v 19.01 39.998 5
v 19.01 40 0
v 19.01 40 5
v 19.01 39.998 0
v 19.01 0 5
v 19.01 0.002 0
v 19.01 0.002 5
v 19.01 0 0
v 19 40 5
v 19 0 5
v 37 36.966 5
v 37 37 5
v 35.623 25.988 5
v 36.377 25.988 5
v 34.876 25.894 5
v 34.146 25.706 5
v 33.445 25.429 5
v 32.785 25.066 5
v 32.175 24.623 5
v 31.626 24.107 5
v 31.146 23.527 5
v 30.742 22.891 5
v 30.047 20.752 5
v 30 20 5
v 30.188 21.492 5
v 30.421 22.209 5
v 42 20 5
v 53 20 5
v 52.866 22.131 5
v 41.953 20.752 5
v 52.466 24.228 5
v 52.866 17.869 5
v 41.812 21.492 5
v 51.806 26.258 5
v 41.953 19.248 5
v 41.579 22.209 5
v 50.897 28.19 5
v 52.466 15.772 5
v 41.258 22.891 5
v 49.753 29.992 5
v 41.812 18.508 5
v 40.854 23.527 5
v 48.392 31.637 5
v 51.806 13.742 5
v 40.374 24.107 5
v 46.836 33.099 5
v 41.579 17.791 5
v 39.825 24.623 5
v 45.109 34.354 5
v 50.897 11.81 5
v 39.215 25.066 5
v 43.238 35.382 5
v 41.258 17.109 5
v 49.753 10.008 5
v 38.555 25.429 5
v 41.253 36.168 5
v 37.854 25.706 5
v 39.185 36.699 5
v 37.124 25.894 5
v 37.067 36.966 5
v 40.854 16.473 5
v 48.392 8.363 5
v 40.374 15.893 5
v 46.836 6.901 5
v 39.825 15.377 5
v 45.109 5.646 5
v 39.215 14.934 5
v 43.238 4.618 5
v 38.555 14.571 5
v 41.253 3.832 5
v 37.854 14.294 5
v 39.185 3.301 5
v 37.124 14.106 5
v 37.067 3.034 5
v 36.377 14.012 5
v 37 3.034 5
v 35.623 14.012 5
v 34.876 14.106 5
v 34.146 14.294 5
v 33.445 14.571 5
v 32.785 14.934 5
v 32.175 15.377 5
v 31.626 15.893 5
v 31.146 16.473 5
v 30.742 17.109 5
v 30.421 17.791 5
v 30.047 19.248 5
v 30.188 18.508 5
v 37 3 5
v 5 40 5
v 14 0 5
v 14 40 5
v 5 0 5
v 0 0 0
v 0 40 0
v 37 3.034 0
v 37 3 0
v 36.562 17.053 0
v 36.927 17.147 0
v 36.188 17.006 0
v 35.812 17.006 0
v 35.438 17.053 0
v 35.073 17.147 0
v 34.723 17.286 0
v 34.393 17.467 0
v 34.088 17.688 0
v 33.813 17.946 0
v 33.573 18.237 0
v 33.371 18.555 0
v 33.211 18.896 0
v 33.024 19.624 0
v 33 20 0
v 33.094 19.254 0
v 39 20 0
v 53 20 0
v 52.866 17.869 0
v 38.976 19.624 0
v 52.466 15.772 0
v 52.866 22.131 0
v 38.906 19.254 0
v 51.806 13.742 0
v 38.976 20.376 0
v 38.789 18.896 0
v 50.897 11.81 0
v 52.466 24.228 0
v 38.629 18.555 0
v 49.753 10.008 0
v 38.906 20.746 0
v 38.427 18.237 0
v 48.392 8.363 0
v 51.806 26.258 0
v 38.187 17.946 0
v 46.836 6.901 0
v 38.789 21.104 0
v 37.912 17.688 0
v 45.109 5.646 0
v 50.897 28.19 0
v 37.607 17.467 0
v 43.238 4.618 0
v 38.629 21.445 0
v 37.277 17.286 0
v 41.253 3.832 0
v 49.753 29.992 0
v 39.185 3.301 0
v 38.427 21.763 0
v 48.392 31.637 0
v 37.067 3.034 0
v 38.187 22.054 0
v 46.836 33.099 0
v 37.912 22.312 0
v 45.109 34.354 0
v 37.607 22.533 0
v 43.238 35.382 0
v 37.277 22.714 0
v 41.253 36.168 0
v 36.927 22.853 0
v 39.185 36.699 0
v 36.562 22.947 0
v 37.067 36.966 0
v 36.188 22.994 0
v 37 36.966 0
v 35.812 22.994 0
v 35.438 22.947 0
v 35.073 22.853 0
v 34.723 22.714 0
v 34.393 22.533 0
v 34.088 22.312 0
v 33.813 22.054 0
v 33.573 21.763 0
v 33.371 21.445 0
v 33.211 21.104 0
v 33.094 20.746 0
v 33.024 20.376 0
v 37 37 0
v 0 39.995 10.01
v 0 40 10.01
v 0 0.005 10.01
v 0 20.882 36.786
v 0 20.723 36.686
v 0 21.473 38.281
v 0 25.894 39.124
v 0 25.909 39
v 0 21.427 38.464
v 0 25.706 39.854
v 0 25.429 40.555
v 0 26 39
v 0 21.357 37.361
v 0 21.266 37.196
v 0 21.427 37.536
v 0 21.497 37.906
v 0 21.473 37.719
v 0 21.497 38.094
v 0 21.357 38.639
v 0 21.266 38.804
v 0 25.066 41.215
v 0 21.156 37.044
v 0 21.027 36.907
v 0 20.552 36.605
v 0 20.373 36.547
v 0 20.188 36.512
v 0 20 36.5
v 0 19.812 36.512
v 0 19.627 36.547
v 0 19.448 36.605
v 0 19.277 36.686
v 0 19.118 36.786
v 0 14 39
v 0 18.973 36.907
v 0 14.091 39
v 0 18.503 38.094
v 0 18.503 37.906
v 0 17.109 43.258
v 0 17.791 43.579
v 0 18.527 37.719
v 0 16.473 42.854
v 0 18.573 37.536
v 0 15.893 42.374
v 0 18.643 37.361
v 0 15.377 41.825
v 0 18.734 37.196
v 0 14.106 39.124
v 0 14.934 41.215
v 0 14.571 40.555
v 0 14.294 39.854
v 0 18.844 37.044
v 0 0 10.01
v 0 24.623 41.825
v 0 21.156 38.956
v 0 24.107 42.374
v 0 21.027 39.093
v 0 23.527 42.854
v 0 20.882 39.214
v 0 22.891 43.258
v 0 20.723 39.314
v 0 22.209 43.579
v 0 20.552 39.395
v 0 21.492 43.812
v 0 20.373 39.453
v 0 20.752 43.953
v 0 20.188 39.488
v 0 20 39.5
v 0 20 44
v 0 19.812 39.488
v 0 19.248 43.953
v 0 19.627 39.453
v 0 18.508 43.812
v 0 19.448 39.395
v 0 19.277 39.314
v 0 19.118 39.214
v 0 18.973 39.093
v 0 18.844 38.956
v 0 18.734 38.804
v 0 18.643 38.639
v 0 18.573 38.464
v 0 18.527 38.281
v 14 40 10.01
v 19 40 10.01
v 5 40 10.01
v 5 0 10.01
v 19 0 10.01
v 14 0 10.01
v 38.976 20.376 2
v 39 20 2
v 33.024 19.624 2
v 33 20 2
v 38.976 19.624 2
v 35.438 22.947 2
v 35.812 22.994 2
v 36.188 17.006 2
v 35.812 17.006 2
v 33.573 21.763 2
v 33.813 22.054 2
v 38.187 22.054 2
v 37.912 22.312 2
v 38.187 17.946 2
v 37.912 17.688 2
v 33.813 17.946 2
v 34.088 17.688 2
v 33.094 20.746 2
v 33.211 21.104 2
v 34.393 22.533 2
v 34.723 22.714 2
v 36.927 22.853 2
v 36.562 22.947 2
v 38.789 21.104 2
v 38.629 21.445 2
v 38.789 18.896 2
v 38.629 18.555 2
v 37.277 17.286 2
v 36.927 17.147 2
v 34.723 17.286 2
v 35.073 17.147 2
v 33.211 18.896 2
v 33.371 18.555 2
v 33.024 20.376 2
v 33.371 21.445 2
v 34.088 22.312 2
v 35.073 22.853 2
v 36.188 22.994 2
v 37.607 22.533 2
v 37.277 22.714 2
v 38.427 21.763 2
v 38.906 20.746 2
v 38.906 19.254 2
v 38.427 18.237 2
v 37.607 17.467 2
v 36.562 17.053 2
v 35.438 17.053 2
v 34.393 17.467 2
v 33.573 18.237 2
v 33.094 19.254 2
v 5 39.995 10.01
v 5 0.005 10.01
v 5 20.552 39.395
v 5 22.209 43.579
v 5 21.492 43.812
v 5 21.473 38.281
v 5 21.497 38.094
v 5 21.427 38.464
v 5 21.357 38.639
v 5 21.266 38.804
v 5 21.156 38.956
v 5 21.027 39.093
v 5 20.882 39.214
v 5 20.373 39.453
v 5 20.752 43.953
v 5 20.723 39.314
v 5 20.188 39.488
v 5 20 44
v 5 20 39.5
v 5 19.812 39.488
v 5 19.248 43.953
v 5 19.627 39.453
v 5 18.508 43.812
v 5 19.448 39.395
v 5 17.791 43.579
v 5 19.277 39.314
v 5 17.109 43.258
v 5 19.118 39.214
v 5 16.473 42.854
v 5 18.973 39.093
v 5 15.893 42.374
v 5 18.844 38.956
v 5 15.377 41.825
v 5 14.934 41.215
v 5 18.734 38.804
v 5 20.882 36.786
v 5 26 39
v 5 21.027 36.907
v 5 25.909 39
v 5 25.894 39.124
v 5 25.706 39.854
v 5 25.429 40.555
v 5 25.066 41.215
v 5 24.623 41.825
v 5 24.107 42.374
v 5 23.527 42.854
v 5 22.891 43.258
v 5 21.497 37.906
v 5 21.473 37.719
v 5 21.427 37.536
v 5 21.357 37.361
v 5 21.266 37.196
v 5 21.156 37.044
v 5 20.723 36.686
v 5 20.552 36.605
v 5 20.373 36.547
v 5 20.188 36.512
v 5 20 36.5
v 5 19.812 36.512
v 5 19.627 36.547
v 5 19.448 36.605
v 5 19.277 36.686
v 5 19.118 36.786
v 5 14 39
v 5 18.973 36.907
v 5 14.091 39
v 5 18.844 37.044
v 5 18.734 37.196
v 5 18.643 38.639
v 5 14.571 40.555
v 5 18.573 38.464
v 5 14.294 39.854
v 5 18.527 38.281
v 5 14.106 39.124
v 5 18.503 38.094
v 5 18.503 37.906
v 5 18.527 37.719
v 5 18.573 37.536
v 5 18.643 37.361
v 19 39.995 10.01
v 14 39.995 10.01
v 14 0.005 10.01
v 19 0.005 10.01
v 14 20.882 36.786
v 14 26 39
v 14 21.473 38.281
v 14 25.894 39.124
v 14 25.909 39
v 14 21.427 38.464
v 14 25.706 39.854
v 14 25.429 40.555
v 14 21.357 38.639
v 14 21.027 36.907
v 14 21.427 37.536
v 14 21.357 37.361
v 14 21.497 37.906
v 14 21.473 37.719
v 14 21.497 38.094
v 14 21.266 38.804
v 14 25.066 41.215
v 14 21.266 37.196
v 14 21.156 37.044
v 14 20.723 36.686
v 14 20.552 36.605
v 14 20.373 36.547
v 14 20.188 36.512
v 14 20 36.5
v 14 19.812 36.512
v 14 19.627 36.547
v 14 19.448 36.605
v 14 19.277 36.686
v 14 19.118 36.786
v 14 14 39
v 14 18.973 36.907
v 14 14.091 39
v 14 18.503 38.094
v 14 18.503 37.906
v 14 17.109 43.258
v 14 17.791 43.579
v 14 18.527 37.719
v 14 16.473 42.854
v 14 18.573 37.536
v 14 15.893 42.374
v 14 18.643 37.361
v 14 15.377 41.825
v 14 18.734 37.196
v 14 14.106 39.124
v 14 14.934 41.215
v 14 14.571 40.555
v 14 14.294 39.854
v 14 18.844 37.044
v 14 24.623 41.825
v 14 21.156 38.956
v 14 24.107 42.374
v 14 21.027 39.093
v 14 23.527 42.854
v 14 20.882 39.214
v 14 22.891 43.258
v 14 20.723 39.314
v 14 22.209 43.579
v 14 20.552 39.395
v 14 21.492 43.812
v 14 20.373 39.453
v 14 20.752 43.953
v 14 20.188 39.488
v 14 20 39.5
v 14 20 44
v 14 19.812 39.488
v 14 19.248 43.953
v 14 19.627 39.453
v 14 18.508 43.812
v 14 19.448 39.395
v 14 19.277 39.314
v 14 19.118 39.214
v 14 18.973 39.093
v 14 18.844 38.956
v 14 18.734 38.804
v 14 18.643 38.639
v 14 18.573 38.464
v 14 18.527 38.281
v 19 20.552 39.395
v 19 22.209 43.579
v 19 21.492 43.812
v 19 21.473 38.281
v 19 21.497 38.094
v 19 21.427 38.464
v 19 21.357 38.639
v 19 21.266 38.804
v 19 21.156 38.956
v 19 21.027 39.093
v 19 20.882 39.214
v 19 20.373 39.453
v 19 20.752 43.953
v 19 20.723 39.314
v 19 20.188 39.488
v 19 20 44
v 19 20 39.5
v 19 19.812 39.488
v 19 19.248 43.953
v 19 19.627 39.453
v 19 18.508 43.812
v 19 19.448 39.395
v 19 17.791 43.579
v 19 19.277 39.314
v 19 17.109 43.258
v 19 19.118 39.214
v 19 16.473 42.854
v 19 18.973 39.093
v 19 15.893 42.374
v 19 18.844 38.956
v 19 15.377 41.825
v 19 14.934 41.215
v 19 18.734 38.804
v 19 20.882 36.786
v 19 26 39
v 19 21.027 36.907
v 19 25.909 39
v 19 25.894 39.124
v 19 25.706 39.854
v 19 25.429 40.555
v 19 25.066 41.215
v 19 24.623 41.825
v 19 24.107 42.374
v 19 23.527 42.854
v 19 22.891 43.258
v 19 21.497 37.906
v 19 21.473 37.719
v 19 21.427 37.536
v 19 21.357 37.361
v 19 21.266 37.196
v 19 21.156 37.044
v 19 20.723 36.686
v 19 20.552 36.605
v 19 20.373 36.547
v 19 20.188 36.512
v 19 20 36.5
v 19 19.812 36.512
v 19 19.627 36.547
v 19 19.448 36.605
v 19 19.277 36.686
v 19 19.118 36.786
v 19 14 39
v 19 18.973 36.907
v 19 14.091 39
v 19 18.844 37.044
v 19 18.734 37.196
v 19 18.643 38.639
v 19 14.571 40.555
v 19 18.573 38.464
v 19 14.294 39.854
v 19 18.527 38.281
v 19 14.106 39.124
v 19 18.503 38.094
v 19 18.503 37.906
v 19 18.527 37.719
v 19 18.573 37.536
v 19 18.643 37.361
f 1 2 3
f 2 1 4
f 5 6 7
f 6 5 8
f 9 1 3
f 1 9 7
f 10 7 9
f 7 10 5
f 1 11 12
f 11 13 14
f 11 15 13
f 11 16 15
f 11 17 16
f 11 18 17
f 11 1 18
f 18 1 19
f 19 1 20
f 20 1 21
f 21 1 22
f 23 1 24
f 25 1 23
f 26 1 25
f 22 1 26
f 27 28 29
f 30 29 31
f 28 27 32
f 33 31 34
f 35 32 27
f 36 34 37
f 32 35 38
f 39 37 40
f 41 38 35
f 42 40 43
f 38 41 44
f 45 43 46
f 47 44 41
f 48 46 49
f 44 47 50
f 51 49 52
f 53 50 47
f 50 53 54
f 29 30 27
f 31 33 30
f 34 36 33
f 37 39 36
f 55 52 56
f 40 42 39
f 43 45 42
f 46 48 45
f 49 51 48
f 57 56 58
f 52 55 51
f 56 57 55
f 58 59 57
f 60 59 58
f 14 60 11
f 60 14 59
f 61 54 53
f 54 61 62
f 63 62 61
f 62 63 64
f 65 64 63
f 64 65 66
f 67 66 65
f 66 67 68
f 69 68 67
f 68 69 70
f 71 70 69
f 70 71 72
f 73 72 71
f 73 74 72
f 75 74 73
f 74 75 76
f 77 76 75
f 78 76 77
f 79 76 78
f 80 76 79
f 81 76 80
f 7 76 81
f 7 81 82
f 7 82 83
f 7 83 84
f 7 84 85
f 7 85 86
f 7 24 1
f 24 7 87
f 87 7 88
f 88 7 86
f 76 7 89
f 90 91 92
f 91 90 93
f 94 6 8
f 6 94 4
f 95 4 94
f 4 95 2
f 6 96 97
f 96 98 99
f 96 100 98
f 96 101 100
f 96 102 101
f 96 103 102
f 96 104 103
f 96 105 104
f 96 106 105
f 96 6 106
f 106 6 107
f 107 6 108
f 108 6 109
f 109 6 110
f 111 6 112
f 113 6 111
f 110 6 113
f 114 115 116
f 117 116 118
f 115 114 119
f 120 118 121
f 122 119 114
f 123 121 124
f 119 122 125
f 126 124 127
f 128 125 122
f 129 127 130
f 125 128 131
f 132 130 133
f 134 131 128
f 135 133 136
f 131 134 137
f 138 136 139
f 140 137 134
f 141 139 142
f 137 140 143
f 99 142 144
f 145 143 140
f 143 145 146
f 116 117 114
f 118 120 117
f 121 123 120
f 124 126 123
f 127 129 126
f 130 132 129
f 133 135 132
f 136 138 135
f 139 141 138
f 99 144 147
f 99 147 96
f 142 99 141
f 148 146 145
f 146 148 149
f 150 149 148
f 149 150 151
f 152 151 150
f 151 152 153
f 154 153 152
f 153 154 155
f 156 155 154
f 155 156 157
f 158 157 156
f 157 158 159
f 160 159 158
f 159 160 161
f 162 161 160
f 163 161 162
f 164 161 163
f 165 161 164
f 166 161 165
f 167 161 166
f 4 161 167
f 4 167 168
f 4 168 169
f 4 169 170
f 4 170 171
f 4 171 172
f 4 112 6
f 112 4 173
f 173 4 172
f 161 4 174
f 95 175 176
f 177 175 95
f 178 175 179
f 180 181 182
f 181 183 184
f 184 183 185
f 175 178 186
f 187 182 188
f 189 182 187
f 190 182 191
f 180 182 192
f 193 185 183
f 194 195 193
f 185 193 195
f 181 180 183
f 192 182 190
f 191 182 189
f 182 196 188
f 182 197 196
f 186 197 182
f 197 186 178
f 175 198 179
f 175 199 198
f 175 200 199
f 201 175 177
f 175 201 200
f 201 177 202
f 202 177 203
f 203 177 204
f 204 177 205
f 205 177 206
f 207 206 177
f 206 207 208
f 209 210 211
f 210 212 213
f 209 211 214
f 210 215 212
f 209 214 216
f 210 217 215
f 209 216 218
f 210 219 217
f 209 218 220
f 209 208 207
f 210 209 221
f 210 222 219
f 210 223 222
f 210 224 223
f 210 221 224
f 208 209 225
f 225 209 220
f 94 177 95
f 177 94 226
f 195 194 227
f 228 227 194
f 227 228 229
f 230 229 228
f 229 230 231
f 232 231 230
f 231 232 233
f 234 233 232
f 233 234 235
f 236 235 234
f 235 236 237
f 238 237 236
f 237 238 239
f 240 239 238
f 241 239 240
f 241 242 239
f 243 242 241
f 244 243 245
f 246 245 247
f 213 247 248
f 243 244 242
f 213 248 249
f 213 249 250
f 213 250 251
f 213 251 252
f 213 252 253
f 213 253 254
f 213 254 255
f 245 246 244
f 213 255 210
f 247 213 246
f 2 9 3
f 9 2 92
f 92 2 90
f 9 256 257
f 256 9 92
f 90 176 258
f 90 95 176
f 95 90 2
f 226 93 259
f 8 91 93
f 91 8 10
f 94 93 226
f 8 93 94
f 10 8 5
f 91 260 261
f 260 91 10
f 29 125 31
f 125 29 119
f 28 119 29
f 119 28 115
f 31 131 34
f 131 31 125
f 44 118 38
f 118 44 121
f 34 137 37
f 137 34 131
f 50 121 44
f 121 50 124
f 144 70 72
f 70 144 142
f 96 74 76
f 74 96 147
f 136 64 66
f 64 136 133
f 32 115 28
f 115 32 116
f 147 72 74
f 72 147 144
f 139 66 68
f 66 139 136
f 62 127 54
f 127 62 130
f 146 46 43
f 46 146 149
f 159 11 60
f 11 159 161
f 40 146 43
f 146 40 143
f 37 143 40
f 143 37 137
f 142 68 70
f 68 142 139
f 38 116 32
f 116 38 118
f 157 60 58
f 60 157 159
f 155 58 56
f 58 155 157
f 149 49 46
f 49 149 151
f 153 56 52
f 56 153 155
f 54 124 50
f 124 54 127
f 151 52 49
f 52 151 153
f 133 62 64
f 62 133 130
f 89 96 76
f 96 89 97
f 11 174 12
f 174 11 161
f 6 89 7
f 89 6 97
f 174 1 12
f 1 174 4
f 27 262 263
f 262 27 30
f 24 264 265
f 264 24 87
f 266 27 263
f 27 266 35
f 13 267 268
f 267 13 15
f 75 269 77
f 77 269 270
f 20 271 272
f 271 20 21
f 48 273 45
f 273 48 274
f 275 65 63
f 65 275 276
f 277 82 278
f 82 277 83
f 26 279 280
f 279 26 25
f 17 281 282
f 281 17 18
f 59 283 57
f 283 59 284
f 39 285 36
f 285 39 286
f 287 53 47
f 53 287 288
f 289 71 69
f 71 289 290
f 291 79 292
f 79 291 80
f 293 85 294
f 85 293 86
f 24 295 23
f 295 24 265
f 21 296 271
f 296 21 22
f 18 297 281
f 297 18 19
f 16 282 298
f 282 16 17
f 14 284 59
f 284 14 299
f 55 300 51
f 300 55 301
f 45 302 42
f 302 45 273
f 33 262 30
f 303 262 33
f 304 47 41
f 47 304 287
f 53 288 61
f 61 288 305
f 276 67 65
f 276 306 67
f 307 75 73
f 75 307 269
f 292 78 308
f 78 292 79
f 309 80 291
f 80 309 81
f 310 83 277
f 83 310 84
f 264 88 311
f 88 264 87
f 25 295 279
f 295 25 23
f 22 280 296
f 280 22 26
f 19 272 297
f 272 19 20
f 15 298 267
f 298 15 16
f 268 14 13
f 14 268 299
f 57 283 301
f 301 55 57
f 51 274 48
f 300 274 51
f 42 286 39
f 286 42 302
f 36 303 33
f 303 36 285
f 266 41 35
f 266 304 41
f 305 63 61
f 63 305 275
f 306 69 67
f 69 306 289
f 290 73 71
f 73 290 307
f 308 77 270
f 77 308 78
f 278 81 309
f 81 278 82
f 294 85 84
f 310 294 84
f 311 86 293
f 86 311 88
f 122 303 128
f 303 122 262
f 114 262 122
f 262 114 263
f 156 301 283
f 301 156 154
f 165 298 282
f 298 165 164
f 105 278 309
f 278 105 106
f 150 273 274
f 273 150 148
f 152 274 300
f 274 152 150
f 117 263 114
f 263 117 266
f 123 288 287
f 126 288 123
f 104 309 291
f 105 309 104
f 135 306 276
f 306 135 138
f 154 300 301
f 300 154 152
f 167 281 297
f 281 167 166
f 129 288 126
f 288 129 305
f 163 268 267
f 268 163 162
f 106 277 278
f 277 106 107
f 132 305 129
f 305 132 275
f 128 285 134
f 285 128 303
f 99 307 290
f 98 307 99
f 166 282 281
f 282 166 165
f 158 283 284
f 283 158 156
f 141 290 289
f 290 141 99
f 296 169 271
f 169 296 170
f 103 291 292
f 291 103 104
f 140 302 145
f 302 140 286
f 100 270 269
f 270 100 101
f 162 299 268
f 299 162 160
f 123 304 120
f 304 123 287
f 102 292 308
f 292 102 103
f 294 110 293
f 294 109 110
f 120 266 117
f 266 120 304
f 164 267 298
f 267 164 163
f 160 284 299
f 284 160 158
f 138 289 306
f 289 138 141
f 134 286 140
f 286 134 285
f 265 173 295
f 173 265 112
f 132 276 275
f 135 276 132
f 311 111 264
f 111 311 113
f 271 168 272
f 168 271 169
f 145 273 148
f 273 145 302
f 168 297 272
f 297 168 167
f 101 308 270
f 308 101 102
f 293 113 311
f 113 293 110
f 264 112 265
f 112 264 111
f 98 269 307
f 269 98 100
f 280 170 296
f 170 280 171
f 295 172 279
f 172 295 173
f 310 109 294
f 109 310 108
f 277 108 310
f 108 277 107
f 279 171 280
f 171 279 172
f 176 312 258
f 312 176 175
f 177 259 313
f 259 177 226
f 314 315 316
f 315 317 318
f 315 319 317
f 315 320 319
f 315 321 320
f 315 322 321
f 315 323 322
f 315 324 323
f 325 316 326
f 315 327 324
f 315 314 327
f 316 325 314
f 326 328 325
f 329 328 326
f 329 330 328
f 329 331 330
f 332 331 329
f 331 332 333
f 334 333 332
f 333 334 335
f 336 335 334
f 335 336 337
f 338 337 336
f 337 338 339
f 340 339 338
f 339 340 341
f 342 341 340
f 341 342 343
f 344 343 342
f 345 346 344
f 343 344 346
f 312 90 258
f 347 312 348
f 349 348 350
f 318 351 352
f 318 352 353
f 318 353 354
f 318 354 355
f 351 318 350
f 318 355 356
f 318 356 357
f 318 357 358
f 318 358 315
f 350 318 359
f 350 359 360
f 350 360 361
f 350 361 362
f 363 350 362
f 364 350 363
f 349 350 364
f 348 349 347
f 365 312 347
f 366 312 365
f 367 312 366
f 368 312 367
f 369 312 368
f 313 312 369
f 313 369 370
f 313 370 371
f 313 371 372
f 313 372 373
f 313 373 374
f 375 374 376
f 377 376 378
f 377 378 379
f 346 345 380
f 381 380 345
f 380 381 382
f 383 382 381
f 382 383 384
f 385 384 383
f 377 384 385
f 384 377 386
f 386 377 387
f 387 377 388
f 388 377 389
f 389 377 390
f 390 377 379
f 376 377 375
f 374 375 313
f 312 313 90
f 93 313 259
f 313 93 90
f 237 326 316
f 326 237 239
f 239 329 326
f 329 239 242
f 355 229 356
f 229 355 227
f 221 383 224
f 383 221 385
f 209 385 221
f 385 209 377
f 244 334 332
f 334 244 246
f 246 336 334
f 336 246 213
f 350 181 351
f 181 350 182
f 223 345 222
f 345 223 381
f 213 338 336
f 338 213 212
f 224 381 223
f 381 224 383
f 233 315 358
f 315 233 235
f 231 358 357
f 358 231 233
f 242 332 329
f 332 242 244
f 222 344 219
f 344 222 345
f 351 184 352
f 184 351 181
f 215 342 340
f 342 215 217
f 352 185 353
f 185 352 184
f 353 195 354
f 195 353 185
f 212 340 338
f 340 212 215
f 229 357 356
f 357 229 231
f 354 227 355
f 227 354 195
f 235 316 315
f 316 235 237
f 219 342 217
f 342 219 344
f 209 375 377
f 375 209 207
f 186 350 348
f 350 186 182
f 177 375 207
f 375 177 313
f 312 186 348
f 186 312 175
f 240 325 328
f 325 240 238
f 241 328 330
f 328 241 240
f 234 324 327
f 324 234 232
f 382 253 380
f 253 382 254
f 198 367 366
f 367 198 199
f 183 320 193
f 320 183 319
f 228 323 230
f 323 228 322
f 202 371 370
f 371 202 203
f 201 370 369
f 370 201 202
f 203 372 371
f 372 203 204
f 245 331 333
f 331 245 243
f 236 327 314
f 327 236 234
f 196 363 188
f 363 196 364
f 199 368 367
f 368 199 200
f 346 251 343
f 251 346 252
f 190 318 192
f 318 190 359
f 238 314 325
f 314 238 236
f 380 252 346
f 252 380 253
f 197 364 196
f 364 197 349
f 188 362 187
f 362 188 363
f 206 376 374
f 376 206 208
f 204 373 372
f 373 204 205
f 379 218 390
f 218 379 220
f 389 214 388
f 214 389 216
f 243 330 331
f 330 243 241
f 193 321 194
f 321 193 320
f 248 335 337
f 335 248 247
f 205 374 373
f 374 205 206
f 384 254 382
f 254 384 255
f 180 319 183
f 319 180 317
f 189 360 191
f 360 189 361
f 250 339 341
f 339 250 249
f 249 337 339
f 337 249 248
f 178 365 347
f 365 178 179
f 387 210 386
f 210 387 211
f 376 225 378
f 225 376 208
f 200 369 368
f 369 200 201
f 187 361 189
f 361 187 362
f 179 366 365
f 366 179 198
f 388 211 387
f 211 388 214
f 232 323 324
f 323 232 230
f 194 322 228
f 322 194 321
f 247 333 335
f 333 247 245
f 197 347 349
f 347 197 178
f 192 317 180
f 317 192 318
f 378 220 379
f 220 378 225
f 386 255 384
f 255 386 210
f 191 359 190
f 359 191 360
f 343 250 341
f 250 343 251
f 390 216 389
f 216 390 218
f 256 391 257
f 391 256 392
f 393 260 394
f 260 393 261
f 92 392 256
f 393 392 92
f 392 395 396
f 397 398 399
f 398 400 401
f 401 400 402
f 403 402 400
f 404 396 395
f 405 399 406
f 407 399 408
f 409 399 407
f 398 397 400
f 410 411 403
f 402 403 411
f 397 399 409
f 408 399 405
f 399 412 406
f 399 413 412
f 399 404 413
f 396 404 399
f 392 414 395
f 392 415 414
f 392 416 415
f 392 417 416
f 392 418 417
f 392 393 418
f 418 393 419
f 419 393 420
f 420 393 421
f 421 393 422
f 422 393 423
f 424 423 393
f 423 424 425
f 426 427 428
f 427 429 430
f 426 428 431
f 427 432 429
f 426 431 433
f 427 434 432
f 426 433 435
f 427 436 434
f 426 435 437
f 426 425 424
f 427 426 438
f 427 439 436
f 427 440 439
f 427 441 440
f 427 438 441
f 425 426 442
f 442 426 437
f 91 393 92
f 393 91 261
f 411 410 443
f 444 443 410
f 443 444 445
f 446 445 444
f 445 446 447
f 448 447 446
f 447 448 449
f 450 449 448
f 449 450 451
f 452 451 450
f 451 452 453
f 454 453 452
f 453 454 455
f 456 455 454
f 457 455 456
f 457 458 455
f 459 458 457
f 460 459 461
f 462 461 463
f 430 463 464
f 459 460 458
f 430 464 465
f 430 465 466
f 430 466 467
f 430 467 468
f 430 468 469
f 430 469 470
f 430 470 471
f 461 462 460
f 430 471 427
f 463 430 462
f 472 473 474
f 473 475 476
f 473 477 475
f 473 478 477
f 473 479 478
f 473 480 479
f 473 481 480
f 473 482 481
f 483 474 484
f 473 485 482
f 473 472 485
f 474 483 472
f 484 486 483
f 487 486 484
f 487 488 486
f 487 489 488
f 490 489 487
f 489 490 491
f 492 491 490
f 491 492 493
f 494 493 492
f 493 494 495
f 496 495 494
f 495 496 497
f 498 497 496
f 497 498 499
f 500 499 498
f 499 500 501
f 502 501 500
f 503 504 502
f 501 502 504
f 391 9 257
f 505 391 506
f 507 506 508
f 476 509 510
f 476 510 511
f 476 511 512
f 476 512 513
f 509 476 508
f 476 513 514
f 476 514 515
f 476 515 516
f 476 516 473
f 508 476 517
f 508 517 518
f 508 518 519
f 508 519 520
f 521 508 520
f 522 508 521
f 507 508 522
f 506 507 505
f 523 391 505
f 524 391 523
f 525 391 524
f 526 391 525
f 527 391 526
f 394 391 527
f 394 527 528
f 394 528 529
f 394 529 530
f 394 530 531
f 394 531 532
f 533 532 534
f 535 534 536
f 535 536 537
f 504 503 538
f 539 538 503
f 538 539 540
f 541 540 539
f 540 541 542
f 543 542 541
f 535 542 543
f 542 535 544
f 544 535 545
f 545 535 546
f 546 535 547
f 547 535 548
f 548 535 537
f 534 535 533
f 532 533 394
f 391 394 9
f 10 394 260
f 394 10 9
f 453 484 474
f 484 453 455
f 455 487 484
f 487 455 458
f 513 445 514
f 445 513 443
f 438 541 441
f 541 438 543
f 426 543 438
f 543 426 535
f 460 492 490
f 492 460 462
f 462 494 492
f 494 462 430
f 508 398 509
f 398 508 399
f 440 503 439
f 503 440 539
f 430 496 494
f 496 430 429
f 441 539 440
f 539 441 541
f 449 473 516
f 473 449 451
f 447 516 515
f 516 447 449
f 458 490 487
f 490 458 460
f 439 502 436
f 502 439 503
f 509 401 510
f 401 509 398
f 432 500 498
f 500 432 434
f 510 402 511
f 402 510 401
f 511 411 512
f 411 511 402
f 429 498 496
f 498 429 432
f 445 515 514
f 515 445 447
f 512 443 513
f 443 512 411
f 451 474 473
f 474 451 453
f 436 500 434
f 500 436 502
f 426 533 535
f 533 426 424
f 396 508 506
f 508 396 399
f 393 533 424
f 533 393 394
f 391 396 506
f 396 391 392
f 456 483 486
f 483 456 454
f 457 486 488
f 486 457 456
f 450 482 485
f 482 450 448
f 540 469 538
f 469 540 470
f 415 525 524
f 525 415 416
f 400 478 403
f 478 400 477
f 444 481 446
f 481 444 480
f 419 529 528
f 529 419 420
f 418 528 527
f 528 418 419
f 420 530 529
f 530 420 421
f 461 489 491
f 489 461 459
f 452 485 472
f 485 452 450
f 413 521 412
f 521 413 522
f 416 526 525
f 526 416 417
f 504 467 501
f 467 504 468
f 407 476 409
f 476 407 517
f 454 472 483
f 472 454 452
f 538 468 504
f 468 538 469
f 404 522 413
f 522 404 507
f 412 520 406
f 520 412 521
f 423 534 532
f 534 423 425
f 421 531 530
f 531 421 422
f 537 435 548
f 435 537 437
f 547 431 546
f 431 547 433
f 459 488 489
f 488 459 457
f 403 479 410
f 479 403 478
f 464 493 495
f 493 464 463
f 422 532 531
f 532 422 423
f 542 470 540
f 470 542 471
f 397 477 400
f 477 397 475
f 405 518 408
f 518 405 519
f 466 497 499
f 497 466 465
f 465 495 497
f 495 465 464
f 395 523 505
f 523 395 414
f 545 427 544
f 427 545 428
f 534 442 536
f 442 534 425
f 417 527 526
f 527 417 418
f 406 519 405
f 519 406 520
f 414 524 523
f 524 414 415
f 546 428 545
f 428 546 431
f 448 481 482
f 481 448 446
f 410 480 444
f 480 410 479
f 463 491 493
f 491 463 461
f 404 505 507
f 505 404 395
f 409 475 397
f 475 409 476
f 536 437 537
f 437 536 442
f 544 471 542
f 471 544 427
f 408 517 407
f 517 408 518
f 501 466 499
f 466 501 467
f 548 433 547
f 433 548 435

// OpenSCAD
$fn=50;

hc=5;
cil=34;
cil2=12;
le=40;
br=19;
br2=10;

difference()
{    
    union()
    {
        translate([0,0,0])
            cube([br+0.01,le,hc], center=false);

        translate([br+cil/2,le/2,0])
            cylinder(h=hc,d=cil,center=false);
        
        CubePoints = [
          [br,0,0 ],  //0
          [br+cil/2+1,(le-cil)/2,0 ],  //1
          [br+cil/2+1,cil+(le-cil)/2,0 ],  //2
          [br,le,0 ],  //3
          [br,0,hc ],  //4
          [br+cil/2+1,(le-cil)/2,hc ],  //5
          [br+cil/2+1,cil+(le-cil)/2,hc ],  //6
          [br,le,hc ]]; //7
          
        CubeFaces = [
          [0,1,2,3],  // bottom
          [4,5,1,0],  // front
          [7,6,5,4],  // top
          [5,6,2,1],  // right
          [6,7,3,2],  // back
          [7,4,0,3]]; // left
          
        polyhedron( CubePoints, CubeFaces );
    
    };      

    translate([br+cil/2,le/2,2])
        cylinder(h=6,d1=0,d2=12,center=true);
    translate([br+cil/2,le/2,3])
        cylinder(h=6,d=6,center=true);
};
translate([5,0,0])
    rotate([0,-90,0])
        difference()
        {    
            union()
            {
                translate([0,0,0])
                    cube([br2+0.01,le,hc], center=false);

                translate([38,le/2,2.5])
                    cylinder(h=hc,d=cil2,center=true);
                
                CubePoints = [
                  [br2,0,0 ],  //0
                  [39,(le-cil2)/2,0 ],  //1
                  [39,cil2+(le-cil2)/2,0 ],  //2
                  [br2,le,0 ],  //3
                  [br2,0,hc ],  //4
                  [39,(le-cil2)/2,hc ],  //5
                  [39,cil2+(le-cil2)/2,hc ],  //6
                  [br2,le,hc ]]; //7
                  
                CubeFaces = [
                  [0,1,2,3],  // bottom
                  [4,5,1,0],  // front
                  [7,6,5,4],  // top
                  [5,6,2,1],  // right
                  [6,7,3,2],  // back
                  [7,4,0,3]]; // left
                  
                polyhedron( CubePoints, CubeFaces );
            
            };      

            translate([38,le/2,2.5])
                cylinder(h=hc+1,d=3,center=true);
        };
        
translate([19,0,0])
    rotate([0,-90,0])
        difference()
        {    
            union()
            {
                translate([0,0,0])
                    cube([br2+0.01,le,hc], center=false);

                translate([38,le/2,2.5])
                    cylinder(h=hc,d=cil2,center=true);
                
                CubePoints = [
                  [br2,0,0 ],  //0
                  [39,(le-cil2)/2,0 ],  //1
                  [39,cil2+(le-cil2)/2,0 ],  //2
                  [br2,le,0 ],  //3
                  [br2,0,hc ],  //4
                  [39,(le-cil2)/2,hc ],  //5
                  [39,cil2+(le-cil2)/2,hc ],  //6
                  [br2,le,hc ]]; //7
                  
                CubeFaces = [
                  [0,1,2,3],  // bottom
                  [4,5,1,0],  // front
                  [7,6,5,4],  // top
                  [5,6,2,1],  // right
                  [6,7,3,2],  // back
                  [7,4,0,3]]; // left
                  
                polyhedron( CubePoints, CubeFaces );
            
            };      

            translate([38,le/2,2.5])
                cylinder(h=hc+1,d=3,center=true);
        };
